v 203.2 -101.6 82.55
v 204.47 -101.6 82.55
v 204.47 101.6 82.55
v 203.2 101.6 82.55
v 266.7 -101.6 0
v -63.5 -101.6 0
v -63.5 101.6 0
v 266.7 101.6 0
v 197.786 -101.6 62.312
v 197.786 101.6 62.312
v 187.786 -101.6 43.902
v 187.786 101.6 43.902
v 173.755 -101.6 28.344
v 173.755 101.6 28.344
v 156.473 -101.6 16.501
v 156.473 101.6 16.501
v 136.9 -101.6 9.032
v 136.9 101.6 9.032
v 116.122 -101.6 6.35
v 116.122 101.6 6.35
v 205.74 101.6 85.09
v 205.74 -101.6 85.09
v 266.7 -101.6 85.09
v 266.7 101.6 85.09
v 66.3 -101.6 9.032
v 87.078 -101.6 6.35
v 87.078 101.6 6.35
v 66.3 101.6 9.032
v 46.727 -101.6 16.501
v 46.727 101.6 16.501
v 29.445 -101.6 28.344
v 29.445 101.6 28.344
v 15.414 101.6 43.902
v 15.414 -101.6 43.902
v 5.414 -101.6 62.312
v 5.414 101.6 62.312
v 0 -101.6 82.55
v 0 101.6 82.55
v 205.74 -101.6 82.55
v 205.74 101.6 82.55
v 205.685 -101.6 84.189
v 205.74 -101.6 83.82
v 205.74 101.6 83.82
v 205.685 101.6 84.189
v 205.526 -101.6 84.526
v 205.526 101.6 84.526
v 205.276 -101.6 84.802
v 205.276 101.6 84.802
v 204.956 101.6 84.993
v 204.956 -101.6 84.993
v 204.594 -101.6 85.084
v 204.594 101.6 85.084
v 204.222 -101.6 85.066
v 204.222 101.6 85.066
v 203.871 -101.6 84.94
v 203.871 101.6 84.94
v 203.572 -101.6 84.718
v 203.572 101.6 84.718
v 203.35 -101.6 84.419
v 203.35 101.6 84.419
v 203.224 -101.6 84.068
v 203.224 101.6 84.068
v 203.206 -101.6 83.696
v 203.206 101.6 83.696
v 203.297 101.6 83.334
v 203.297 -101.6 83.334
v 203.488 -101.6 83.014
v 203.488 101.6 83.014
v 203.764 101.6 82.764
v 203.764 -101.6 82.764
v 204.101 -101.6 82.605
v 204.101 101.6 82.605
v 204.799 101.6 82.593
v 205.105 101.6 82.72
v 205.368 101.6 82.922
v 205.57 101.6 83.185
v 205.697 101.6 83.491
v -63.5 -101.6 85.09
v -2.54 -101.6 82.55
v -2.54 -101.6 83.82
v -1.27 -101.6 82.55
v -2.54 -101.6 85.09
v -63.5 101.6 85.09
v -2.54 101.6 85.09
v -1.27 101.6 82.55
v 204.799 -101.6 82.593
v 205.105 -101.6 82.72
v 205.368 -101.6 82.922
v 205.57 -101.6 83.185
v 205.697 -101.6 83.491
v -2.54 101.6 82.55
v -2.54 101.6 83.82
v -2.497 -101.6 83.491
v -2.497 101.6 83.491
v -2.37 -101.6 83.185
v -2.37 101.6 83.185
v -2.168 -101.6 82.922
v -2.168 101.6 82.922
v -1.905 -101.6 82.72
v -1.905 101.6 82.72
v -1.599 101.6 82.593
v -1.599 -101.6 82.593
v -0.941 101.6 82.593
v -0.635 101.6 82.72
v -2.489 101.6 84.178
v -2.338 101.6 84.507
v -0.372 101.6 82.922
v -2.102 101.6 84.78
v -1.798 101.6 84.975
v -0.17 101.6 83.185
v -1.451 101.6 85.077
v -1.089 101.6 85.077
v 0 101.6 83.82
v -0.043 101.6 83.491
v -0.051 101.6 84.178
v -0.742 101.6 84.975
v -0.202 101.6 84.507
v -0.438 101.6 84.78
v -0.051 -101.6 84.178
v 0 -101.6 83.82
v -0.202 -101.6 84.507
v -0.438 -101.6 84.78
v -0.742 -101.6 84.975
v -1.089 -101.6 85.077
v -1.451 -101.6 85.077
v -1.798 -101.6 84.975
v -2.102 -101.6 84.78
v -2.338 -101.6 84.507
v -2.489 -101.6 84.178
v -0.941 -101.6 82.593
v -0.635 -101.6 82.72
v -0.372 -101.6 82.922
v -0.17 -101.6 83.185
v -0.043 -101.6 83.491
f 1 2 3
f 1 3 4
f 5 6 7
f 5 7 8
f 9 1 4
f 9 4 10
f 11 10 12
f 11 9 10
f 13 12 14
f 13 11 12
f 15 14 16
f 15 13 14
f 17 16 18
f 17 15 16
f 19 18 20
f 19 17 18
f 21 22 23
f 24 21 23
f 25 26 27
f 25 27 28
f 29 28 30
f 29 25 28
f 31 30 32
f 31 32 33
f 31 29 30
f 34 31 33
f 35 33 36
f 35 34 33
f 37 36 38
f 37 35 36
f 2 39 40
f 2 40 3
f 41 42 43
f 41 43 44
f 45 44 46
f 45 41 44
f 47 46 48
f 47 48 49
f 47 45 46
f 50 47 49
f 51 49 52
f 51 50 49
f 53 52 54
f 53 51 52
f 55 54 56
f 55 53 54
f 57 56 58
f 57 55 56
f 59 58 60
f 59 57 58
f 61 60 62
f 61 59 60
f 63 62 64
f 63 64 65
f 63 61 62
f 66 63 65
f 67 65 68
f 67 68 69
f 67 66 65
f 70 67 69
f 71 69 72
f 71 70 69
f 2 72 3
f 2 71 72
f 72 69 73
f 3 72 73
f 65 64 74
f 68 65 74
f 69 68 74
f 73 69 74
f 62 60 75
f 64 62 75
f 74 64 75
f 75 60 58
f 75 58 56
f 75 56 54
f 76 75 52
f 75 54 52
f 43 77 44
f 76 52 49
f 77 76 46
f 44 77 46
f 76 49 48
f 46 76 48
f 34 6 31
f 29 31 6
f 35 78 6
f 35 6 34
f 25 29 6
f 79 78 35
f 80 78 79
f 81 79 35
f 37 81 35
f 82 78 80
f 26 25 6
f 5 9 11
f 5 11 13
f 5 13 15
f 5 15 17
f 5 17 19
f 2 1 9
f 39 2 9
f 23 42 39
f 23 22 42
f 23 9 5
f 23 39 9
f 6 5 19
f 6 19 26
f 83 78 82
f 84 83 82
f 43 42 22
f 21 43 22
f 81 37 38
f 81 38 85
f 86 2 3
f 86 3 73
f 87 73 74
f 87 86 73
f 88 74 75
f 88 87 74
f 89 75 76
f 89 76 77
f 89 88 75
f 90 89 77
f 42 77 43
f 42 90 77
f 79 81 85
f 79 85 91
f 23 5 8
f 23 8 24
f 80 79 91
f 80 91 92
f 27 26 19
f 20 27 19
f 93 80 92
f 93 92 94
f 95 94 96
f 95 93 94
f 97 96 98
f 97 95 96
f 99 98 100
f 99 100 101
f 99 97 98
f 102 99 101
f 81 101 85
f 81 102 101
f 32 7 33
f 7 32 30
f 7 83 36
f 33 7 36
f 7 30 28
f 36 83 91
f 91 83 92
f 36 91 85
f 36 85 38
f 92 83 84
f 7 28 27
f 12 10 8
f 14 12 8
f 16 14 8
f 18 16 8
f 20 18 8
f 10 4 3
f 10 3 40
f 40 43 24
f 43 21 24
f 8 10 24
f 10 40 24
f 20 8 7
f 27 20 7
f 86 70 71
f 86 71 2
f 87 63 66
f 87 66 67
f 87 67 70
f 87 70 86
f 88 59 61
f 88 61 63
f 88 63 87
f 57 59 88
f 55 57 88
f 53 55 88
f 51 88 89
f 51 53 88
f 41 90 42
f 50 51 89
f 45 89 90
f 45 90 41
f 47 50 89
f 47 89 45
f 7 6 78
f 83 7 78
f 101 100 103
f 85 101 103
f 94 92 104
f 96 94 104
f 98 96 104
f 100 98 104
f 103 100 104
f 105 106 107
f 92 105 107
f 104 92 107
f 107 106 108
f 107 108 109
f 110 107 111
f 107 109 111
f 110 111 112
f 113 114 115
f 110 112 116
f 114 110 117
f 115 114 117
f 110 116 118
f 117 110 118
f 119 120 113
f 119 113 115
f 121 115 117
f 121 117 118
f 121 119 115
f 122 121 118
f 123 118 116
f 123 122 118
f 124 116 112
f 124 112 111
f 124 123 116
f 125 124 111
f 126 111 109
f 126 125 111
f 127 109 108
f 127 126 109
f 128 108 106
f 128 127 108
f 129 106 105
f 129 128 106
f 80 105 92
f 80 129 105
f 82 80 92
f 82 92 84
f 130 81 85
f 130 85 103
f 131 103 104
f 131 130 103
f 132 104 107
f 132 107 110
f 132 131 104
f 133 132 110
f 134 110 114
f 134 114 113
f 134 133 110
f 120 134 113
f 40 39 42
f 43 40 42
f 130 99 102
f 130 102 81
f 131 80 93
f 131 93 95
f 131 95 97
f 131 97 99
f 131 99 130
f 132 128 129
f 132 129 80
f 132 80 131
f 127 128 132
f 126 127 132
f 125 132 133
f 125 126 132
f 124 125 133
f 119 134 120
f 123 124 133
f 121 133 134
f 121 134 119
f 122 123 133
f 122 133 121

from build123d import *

# Parameters (mm, degrees)
F0_W     = 203.2
F0_H     = 6.35
F1_DEPTH = 101.6
F3_DEPTH = 203.2
F5_DEPTH = 203.2
F6_W     = 60.96
F6_H     = 2.54
F7_DEPTH = 203.2


with BuildPart() as f1:
    # F0 (on Front) → F1 (new body, symmetric)
    with BuildSketch(Plane.XZ):
        with Locations((101.6, 3.175)):
            Rectangle(F0_W, F0_H)
    extrude(amount=F1_DEPTH, both=True)

    # F2 (on face) → F3 (join)
    with BuildSketch(Plane.XZ.offset(101.6)):
        Polygon((0, 6.35), (0, 82.55), (-63.5, 82.55), (-63.5, 0), (0, 0), align=None)
        with BuildLine():
            ThreePointArc((87.0777097162, 6.35), (29.4447475543, 28.3439293371), (0, 82.55))
            Line((0, 82.55), (0, 6.35))
            Line((0, 6.35), (87.0777097162, 6.35))
        make_face()
        with BuildLine():
            ThreePointArc((203.2, 82.55), (173.7552524457, 28.3439293371), (116.1222902838, 6.35))
            Line((116.1222902838, 6.35), (203.2, 6.35))
            Line((203.2, 6.35), (203.2, 82.55))
        make_face()
        Polygon((203.2, 6.35), (203.2, 0), (266.7, 0), (266.7, 82.55), (203.2, 82.55), align=None)
    extrude(amount=-F3_DEPTH)


with BuildPart() as f5:
    # F4 (on face) → F5 (new body)
    with BuildSketch(Plane.XZ.offset(101.6)):
        with BuildLine():
            ThreePointArc((0, 83.82), (-2.1680256121, 84.7180256121), (-1.27, 82.55))
            ThreePointArc((-1.27, 82.55), (-0.3719743879, 82.9219743879), (0, 83.82))
        make_face()
    extrude(amount=-F5_DEPTH)


with BuildPart() as f5b:
    # F4 (on face) → F5, piece 2 (new body)
    with BuildSketch(Plane.XZ.offset(101.6)):
        with BuildLine():
            ThreePointArc((204.47, 82.55), (205.3680256121, 82.9219743879), (205.74, 83.82))
            ThreePointArc((205.74, 83.82), (203.5719743879, 84.7180256121), (204.47, 82.55))
        make_face()
    extrude(amount=-F5_DEPTH)


with BuildPart() as f7:
    # F6 (on face) → F7 (new body)
    with BuildSketch(Plane.XZ.offset(101.6)):
        with Locations((-33.02, 83.82)):
            Rectangle(F6_W, F6_H)
    extrude(amount=-F7_DEPTH)


with BuildPart() as f7b:
    # F6 (on face) → F7, piece 2 (new body)
    with BuildSketch(Plane.XZ.offset(101.6)):
        with Locations((236.22, 83.82)):
            Rectangle(F6_W, F6_H)
    extrude(amount=-F7_DEPTH)


with BuildPart() as f1_1:
    add(f1.part)

    # F8: union F5, F5b, F7, F7b
    add(f5.part)
    add(f5b.part)
    add(f7.part)
    add(f7b.part)


solid = f1_1.part
